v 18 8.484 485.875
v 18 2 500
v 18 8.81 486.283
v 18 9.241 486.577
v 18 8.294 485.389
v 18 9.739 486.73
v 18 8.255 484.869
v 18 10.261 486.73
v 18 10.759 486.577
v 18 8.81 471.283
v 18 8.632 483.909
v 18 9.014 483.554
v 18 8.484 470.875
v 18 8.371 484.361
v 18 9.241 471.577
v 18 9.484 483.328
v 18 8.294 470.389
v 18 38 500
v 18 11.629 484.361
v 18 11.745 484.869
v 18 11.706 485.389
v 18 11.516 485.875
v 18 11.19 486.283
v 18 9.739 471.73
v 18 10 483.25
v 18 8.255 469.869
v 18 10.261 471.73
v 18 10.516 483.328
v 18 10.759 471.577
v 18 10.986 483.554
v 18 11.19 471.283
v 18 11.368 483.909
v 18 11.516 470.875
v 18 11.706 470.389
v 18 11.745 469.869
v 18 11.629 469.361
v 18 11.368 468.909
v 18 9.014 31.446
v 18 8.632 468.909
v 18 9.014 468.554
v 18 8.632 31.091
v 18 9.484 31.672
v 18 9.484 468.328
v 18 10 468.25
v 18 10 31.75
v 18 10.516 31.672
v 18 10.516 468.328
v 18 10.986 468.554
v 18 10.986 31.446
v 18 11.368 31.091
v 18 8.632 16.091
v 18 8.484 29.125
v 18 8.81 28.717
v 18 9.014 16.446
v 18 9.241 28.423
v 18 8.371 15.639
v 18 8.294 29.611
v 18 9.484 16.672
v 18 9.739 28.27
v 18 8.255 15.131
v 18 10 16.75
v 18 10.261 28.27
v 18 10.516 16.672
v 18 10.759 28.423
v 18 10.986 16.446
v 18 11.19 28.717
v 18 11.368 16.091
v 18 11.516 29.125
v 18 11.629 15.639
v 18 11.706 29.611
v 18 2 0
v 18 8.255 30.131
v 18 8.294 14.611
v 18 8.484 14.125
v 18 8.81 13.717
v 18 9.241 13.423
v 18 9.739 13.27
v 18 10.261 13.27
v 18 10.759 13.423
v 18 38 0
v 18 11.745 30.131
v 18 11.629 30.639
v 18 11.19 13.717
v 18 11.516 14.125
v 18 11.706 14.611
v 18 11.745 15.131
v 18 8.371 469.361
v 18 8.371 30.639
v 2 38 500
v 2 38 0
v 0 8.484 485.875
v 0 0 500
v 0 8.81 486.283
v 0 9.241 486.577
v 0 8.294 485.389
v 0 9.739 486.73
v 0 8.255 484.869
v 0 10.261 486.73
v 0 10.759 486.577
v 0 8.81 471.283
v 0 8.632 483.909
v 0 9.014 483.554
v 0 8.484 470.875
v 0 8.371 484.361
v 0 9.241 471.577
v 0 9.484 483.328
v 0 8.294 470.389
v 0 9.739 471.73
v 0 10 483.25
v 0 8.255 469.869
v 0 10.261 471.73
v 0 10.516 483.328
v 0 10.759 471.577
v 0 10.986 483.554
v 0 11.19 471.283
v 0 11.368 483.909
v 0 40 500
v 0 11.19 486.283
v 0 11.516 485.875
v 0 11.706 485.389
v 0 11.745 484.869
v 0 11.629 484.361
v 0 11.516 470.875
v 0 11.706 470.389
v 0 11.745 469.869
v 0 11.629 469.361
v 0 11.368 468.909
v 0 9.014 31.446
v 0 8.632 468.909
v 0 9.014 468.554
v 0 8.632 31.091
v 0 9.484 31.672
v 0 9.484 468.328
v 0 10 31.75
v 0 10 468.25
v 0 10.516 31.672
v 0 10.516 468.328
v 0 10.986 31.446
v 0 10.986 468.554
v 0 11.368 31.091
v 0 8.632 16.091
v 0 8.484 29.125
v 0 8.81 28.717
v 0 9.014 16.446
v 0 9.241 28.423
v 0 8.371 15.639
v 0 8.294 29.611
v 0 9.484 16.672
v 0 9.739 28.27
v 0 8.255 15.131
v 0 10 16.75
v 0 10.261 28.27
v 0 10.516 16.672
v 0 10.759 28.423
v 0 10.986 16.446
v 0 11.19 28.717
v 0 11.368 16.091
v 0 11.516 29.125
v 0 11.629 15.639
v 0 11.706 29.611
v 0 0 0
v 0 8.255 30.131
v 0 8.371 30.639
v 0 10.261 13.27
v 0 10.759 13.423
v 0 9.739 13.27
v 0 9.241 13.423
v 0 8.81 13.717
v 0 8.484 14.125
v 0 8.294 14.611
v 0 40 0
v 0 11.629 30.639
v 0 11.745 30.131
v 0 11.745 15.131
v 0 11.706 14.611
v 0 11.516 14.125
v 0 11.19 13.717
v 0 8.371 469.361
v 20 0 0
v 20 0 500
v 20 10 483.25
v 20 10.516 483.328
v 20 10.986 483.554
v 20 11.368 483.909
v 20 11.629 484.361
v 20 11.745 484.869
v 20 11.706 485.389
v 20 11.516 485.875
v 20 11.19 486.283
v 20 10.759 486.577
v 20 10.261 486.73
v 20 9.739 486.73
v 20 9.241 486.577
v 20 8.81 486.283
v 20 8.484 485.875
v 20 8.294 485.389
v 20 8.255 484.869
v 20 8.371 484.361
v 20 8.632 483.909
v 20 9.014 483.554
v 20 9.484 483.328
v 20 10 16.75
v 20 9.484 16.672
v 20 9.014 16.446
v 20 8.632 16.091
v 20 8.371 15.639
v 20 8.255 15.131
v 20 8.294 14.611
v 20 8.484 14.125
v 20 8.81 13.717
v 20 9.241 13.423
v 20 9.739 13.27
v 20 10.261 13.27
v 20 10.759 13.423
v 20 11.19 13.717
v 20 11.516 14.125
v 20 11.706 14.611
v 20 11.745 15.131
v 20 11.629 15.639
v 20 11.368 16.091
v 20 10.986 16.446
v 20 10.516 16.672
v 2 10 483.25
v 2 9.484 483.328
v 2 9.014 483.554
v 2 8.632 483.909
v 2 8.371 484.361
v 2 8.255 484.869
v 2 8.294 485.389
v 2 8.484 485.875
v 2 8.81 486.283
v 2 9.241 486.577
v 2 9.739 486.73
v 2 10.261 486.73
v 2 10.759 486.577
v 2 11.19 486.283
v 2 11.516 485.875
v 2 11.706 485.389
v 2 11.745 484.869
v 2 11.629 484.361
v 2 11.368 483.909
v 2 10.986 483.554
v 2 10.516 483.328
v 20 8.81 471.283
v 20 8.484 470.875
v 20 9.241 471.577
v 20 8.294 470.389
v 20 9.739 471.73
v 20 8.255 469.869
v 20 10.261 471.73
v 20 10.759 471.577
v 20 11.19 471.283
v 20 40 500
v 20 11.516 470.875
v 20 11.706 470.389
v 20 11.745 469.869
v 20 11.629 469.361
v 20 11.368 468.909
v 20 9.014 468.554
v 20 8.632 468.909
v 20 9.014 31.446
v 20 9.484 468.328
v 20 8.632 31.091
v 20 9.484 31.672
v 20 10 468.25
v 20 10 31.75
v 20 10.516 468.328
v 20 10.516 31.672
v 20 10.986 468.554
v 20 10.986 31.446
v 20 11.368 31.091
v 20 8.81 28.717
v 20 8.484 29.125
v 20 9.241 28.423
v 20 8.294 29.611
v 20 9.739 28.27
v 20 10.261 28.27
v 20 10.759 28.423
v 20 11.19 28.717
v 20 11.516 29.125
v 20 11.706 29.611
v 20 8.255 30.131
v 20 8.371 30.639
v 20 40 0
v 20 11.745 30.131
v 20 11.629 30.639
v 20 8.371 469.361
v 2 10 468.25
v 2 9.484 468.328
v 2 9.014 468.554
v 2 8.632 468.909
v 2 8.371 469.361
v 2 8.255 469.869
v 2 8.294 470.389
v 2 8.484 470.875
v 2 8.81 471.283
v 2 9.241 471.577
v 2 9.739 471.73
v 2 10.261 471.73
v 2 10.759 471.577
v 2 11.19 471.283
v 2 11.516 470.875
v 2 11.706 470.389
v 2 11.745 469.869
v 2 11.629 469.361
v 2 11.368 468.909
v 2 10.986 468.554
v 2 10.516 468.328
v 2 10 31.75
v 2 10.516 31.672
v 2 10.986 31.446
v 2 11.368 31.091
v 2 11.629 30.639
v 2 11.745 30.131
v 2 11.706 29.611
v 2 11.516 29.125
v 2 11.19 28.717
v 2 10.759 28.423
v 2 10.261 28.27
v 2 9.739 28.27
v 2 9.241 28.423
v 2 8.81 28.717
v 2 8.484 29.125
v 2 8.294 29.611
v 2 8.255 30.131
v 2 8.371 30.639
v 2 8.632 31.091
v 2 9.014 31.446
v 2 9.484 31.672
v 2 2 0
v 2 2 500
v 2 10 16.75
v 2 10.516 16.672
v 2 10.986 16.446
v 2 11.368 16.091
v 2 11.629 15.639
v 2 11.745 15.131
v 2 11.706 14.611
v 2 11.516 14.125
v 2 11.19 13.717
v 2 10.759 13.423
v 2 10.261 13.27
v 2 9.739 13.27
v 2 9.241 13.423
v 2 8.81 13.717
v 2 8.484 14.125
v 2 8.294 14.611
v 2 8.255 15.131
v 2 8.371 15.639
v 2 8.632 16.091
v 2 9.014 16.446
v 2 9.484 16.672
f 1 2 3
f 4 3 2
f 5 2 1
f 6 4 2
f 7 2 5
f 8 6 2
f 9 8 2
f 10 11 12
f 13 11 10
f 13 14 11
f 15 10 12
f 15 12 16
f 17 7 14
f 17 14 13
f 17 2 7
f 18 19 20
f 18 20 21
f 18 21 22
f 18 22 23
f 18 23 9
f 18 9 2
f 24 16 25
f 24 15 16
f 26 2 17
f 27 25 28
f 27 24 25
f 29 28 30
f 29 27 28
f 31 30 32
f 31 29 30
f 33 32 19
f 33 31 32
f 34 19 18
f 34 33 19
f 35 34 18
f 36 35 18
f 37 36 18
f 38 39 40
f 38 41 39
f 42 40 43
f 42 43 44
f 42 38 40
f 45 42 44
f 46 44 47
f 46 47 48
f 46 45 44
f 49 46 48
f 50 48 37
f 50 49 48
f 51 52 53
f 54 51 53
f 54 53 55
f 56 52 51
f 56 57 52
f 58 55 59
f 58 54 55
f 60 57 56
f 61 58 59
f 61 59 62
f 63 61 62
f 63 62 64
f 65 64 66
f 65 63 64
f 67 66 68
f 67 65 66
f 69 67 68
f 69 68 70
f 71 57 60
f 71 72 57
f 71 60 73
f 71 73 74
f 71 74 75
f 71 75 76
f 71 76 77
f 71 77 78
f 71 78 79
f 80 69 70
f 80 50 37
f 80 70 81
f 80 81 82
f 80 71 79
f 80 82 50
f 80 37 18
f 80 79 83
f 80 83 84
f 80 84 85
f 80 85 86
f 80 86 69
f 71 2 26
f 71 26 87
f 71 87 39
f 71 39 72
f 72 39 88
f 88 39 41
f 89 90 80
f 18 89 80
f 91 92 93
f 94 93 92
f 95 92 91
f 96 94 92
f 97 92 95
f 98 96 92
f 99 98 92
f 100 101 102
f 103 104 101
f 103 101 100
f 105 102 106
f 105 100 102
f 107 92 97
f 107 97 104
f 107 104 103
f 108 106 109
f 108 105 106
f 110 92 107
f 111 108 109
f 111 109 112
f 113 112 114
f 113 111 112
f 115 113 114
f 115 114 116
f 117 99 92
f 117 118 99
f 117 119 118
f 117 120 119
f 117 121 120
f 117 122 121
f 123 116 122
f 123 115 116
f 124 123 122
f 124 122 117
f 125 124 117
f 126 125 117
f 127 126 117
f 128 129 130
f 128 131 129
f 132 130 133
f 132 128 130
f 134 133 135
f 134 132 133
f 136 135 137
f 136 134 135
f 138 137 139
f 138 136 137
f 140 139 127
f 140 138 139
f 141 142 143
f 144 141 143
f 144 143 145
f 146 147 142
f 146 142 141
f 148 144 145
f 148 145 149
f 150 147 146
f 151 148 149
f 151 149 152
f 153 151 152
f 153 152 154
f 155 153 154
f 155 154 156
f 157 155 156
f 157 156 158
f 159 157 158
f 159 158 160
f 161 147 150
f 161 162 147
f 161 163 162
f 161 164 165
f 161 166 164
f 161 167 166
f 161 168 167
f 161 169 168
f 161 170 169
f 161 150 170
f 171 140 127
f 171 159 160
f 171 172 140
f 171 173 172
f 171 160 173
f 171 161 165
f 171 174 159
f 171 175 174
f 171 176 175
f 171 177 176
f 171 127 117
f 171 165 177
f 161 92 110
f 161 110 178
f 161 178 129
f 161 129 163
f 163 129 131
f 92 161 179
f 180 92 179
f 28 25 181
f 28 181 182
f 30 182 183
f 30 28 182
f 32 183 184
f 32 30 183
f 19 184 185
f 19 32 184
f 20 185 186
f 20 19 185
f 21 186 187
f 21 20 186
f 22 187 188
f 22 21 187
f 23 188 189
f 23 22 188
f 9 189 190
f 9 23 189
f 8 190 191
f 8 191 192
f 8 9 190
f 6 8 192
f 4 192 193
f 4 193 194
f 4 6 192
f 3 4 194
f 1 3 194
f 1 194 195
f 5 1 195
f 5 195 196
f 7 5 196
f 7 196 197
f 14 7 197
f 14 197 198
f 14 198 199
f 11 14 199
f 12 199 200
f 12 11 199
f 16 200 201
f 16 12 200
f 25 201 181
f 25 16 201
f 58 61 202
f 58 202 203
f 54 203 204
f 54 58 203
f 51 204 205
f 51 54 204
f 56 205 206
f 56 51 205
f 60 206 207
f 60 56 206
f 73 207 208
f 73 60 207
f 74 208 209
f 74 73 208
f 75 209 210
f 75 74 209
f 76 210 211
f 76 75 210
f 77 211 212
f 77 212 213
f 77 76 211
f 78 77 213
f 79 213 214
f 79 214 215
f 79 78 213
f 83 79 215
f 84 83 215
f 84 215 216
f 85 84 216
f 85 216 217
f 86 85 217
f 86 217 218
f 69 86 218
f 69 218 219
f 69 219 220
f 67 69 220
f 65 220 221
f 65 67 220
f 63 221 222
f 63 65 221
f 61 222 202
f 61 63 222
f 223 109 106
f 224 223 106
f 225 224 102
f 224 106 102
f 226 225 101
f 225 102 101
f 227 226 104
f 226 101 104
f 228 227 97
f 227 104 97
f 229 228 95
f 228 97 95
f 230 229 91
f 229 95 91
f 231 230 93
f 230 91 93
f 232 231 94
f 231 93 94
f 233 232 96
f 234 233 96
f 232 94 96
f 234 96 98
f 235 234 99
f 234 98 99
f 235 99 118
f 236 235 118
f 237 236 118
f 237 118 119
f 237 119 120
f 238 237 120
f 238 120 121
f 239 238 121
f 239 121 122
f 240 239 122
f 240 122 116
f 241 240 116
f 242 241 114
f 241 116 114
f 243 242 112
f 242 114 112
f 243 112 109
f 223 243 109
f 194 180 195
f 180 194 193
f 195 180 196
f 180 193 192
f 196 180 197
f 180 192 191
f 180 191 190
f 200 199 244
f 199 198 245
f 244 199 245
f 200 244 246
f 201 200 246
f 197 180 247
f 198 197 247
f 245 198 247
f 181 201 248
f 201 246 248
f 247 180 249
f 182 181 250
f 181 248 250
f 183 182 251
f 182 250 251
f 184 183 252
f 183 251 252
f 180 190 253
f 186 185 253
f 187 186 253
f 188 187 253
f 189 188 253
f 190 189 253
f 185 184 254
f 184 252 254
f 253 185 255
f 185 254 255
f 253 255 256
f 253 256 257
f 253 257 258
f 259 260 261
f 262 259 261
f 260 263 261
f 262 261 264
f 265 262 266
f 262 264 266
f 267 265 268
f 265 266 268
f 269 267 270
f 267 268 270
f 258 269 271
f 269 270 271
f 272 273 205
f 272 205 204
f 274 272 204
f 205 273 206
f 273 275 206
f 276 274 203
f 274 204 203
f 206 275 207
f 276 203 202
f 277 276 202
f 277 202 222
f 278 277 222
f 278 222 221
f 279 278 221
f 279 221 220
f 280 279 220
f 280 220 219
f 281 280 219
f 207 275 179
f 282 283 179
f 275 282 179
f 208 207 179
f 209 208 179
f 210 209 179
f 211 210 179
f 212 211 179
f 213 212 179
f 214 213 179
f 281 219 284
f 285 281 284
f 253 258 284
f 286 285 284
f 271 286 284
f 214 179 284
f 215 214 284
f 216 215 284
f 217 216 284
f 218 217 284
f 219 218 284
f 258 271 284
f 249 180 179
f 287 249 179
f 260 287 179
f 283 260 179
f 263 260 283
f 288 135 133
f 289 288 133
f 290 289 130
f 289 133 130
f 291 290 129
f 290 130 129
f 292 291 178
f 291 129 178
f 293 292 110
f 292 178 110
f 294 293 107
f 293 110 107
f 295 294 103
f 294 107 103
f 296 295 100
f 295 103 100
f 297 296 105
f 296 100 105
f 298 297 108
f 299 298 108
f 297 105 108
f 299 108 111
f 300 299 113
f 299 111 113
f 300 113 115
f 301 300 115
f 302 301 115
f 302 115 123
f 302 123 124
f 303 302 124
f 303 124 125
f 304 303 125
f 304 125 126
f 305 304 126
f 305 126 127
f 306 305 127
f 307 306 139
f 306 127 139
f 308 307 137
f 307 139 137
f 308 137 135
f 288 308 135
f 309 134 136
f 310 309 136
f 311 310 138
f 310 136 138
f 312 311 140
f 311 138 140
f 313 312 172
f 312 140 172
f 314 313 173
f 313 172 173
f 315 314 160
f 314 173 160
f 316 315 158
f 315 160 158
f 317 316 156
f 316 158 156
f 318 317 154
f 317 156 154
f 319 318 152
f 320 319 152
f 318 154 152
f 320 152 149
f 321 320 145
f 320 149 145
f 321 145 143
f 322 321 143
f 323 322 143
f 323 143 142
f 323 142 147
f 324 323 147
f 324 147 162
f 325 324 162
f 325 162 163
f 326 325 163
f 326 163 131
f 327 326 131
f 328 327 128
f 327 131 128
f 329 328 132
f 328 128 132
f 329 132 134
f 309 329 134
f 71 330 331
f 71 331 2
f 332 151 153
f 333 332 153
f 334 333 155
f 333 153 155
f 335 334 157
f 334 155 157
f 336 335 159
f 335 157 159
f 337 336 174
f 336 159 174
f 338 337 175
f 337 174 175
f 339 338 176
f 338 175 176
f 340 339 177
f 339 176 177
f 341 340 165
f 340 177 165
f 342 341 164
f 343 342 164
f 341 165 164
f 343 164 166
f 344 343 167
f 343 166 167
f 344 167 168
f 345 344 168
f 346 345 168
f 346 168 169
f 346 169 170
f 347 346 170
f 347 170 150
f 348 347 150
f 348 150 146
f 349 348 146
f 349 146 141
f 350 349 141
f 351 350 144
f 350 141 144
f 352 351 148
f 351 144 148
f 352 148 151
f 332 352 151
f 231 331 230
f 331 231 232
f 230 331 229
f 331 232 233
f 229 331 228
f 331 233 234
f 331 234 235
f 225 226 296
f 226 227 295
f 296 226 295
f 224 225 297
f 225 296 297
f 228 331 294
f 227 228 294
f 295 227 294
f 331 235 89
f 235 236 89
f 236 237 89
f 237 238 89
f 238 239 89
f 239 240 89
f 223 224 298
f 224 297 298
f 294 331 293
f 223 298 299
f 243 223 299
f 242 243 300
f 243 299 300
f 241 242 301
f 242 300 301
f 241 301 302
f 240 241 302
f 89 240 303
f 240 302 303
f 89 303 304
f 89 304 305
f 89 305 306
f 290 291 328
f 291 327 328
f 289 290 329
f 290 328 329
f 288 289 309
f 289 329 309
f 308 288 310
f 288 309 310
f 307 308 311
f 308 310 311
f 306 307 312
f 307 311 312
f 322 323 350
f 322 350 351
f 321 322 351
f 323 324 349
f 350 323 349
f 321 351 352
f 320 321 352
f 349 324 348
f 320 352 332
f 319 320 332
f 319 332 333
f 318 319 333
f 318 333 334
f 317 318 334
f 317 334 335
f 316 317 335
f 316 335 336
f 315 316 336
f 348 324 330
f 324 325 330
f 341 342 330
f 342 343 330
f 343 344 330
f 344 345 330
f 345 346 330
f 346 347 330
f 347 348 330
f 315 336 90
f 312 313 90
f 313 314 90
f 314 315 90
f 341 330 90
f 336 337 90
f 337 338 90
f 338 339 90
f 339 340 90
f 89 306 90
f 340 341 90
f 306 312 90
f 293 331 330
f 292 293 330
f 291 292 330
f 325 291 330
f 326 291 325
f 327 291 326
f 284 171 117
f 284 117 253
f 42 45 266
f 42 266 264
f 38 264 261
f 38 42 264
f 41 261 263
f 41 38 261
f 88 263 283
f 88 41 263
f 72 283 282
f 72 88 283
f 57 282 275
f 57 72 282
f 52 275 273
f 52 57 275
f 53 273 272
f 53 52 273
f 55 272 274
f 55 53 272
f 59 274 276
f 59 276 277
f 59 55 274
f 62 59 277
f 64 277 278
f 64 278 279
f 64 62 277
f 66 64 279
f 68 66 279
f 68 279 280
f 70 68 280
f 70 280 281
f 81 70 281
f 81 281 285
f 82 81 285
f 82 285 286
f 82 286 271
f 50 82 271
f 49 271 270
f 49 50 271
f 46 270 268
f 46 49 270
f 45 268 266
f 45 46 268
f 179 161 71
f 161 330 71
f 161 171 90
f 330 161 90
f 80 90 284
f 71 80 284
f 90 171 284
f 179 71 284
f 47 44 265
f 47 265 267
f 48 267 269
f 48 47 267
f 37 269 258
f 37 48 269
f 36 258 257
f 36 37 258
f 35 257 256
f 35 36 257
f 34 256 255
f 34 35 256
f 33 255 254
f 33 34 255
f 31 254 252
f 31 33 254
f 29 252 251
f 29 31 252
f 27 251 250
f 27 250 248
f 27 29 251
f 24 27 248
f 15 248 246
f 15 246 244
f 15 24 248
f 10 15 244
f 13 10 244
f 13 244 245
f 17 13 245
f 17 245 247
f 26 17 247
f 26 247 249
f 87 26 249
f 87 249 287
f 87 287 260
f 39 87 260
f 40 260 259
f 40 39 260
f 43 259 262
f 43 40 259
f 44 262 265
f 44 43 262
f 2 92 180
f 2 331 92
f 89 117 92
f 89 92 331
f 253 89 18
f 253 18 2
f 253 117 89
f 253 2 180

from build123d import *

# Parameters (mm, degrees)
ESBO_O1_W                = 20
ESBO_O1_H                = 40
ESBO_O1_W_2              = 16
ESBO_O1_H_2              = 36
RESSALTO_EXTRUS_O1_DEPTH = 500
ESBO_O2_R                = 1.75
CORTE_EXTRUS_O1_DEPTH    = 2
CORTE_EXTRUS_O2_START    = -2
ESBO_O5_R                = 1.75
CORTE_EXTRUS_O2_DEPTH    = 2


with BuildPart() as part:
    # Esboço1 → Ressalto-extrusão1 (new body)
    with BuildSketch(Plane.XY):
        with Locations((10, 20)):
            Rectangle(ESBO_O1_W, ESBO_O1_H)
        with Locations((10, 20)):
            Rectangle(ESBO_O1_W_2, ESBO_O1_H_2, mode=Mode.SUBTRACT)
    extrude(amount=RESSALTO_EXTRUS_O1_DEPTH)

    # Esboço2 → Corte-extrusão1 (cut)
    with BuildSketch(Plane.ZY):
        with Locations((15, 10)):
            Circle(ESBO_O2_R)
        with Locations((30, 10)):
            Circle(ESBO_O2_R)
        with Locations(Location((485, 10, 0), (0, 0, 180))):
            Circle(ESBO_O2_R)
        with Locations(Location((470, 10, 0), (0, 0, 180))):
            Circle(ESBO_O2_R)
    extrude(amount=-CORTE_EXTRUS_O1_DEPTH, mode=Mode.SUBTRACT)

    # Esboço5 → Corte-extrusão2 (cut)
    with BuildSketch(Plane(origin=(20, 0, 0), x_dir=(0, 0, -1), z_dir=(1, 0, 0)).offset(CORTE_EXTRUS_O2_START)):
        with Locations(Location((-15, 10, 0), (0, 0, 180))):
            Circle(ESBO_O5_R)
        with Locations(Location((-30, 10, 0), (0, 0, 180))):
            Circle(ESBO_O5_R)
        with Locations((-485, 10)):
            Circle(ESBO_O5_R)
        with Locations((-470, 10)):
            Circle(ESBO_O5_R)
    extrude(amount=CORTE_EXTRUS_O2_DEPTH, mode=Mode.SUBTRACT)


solid = part.part
